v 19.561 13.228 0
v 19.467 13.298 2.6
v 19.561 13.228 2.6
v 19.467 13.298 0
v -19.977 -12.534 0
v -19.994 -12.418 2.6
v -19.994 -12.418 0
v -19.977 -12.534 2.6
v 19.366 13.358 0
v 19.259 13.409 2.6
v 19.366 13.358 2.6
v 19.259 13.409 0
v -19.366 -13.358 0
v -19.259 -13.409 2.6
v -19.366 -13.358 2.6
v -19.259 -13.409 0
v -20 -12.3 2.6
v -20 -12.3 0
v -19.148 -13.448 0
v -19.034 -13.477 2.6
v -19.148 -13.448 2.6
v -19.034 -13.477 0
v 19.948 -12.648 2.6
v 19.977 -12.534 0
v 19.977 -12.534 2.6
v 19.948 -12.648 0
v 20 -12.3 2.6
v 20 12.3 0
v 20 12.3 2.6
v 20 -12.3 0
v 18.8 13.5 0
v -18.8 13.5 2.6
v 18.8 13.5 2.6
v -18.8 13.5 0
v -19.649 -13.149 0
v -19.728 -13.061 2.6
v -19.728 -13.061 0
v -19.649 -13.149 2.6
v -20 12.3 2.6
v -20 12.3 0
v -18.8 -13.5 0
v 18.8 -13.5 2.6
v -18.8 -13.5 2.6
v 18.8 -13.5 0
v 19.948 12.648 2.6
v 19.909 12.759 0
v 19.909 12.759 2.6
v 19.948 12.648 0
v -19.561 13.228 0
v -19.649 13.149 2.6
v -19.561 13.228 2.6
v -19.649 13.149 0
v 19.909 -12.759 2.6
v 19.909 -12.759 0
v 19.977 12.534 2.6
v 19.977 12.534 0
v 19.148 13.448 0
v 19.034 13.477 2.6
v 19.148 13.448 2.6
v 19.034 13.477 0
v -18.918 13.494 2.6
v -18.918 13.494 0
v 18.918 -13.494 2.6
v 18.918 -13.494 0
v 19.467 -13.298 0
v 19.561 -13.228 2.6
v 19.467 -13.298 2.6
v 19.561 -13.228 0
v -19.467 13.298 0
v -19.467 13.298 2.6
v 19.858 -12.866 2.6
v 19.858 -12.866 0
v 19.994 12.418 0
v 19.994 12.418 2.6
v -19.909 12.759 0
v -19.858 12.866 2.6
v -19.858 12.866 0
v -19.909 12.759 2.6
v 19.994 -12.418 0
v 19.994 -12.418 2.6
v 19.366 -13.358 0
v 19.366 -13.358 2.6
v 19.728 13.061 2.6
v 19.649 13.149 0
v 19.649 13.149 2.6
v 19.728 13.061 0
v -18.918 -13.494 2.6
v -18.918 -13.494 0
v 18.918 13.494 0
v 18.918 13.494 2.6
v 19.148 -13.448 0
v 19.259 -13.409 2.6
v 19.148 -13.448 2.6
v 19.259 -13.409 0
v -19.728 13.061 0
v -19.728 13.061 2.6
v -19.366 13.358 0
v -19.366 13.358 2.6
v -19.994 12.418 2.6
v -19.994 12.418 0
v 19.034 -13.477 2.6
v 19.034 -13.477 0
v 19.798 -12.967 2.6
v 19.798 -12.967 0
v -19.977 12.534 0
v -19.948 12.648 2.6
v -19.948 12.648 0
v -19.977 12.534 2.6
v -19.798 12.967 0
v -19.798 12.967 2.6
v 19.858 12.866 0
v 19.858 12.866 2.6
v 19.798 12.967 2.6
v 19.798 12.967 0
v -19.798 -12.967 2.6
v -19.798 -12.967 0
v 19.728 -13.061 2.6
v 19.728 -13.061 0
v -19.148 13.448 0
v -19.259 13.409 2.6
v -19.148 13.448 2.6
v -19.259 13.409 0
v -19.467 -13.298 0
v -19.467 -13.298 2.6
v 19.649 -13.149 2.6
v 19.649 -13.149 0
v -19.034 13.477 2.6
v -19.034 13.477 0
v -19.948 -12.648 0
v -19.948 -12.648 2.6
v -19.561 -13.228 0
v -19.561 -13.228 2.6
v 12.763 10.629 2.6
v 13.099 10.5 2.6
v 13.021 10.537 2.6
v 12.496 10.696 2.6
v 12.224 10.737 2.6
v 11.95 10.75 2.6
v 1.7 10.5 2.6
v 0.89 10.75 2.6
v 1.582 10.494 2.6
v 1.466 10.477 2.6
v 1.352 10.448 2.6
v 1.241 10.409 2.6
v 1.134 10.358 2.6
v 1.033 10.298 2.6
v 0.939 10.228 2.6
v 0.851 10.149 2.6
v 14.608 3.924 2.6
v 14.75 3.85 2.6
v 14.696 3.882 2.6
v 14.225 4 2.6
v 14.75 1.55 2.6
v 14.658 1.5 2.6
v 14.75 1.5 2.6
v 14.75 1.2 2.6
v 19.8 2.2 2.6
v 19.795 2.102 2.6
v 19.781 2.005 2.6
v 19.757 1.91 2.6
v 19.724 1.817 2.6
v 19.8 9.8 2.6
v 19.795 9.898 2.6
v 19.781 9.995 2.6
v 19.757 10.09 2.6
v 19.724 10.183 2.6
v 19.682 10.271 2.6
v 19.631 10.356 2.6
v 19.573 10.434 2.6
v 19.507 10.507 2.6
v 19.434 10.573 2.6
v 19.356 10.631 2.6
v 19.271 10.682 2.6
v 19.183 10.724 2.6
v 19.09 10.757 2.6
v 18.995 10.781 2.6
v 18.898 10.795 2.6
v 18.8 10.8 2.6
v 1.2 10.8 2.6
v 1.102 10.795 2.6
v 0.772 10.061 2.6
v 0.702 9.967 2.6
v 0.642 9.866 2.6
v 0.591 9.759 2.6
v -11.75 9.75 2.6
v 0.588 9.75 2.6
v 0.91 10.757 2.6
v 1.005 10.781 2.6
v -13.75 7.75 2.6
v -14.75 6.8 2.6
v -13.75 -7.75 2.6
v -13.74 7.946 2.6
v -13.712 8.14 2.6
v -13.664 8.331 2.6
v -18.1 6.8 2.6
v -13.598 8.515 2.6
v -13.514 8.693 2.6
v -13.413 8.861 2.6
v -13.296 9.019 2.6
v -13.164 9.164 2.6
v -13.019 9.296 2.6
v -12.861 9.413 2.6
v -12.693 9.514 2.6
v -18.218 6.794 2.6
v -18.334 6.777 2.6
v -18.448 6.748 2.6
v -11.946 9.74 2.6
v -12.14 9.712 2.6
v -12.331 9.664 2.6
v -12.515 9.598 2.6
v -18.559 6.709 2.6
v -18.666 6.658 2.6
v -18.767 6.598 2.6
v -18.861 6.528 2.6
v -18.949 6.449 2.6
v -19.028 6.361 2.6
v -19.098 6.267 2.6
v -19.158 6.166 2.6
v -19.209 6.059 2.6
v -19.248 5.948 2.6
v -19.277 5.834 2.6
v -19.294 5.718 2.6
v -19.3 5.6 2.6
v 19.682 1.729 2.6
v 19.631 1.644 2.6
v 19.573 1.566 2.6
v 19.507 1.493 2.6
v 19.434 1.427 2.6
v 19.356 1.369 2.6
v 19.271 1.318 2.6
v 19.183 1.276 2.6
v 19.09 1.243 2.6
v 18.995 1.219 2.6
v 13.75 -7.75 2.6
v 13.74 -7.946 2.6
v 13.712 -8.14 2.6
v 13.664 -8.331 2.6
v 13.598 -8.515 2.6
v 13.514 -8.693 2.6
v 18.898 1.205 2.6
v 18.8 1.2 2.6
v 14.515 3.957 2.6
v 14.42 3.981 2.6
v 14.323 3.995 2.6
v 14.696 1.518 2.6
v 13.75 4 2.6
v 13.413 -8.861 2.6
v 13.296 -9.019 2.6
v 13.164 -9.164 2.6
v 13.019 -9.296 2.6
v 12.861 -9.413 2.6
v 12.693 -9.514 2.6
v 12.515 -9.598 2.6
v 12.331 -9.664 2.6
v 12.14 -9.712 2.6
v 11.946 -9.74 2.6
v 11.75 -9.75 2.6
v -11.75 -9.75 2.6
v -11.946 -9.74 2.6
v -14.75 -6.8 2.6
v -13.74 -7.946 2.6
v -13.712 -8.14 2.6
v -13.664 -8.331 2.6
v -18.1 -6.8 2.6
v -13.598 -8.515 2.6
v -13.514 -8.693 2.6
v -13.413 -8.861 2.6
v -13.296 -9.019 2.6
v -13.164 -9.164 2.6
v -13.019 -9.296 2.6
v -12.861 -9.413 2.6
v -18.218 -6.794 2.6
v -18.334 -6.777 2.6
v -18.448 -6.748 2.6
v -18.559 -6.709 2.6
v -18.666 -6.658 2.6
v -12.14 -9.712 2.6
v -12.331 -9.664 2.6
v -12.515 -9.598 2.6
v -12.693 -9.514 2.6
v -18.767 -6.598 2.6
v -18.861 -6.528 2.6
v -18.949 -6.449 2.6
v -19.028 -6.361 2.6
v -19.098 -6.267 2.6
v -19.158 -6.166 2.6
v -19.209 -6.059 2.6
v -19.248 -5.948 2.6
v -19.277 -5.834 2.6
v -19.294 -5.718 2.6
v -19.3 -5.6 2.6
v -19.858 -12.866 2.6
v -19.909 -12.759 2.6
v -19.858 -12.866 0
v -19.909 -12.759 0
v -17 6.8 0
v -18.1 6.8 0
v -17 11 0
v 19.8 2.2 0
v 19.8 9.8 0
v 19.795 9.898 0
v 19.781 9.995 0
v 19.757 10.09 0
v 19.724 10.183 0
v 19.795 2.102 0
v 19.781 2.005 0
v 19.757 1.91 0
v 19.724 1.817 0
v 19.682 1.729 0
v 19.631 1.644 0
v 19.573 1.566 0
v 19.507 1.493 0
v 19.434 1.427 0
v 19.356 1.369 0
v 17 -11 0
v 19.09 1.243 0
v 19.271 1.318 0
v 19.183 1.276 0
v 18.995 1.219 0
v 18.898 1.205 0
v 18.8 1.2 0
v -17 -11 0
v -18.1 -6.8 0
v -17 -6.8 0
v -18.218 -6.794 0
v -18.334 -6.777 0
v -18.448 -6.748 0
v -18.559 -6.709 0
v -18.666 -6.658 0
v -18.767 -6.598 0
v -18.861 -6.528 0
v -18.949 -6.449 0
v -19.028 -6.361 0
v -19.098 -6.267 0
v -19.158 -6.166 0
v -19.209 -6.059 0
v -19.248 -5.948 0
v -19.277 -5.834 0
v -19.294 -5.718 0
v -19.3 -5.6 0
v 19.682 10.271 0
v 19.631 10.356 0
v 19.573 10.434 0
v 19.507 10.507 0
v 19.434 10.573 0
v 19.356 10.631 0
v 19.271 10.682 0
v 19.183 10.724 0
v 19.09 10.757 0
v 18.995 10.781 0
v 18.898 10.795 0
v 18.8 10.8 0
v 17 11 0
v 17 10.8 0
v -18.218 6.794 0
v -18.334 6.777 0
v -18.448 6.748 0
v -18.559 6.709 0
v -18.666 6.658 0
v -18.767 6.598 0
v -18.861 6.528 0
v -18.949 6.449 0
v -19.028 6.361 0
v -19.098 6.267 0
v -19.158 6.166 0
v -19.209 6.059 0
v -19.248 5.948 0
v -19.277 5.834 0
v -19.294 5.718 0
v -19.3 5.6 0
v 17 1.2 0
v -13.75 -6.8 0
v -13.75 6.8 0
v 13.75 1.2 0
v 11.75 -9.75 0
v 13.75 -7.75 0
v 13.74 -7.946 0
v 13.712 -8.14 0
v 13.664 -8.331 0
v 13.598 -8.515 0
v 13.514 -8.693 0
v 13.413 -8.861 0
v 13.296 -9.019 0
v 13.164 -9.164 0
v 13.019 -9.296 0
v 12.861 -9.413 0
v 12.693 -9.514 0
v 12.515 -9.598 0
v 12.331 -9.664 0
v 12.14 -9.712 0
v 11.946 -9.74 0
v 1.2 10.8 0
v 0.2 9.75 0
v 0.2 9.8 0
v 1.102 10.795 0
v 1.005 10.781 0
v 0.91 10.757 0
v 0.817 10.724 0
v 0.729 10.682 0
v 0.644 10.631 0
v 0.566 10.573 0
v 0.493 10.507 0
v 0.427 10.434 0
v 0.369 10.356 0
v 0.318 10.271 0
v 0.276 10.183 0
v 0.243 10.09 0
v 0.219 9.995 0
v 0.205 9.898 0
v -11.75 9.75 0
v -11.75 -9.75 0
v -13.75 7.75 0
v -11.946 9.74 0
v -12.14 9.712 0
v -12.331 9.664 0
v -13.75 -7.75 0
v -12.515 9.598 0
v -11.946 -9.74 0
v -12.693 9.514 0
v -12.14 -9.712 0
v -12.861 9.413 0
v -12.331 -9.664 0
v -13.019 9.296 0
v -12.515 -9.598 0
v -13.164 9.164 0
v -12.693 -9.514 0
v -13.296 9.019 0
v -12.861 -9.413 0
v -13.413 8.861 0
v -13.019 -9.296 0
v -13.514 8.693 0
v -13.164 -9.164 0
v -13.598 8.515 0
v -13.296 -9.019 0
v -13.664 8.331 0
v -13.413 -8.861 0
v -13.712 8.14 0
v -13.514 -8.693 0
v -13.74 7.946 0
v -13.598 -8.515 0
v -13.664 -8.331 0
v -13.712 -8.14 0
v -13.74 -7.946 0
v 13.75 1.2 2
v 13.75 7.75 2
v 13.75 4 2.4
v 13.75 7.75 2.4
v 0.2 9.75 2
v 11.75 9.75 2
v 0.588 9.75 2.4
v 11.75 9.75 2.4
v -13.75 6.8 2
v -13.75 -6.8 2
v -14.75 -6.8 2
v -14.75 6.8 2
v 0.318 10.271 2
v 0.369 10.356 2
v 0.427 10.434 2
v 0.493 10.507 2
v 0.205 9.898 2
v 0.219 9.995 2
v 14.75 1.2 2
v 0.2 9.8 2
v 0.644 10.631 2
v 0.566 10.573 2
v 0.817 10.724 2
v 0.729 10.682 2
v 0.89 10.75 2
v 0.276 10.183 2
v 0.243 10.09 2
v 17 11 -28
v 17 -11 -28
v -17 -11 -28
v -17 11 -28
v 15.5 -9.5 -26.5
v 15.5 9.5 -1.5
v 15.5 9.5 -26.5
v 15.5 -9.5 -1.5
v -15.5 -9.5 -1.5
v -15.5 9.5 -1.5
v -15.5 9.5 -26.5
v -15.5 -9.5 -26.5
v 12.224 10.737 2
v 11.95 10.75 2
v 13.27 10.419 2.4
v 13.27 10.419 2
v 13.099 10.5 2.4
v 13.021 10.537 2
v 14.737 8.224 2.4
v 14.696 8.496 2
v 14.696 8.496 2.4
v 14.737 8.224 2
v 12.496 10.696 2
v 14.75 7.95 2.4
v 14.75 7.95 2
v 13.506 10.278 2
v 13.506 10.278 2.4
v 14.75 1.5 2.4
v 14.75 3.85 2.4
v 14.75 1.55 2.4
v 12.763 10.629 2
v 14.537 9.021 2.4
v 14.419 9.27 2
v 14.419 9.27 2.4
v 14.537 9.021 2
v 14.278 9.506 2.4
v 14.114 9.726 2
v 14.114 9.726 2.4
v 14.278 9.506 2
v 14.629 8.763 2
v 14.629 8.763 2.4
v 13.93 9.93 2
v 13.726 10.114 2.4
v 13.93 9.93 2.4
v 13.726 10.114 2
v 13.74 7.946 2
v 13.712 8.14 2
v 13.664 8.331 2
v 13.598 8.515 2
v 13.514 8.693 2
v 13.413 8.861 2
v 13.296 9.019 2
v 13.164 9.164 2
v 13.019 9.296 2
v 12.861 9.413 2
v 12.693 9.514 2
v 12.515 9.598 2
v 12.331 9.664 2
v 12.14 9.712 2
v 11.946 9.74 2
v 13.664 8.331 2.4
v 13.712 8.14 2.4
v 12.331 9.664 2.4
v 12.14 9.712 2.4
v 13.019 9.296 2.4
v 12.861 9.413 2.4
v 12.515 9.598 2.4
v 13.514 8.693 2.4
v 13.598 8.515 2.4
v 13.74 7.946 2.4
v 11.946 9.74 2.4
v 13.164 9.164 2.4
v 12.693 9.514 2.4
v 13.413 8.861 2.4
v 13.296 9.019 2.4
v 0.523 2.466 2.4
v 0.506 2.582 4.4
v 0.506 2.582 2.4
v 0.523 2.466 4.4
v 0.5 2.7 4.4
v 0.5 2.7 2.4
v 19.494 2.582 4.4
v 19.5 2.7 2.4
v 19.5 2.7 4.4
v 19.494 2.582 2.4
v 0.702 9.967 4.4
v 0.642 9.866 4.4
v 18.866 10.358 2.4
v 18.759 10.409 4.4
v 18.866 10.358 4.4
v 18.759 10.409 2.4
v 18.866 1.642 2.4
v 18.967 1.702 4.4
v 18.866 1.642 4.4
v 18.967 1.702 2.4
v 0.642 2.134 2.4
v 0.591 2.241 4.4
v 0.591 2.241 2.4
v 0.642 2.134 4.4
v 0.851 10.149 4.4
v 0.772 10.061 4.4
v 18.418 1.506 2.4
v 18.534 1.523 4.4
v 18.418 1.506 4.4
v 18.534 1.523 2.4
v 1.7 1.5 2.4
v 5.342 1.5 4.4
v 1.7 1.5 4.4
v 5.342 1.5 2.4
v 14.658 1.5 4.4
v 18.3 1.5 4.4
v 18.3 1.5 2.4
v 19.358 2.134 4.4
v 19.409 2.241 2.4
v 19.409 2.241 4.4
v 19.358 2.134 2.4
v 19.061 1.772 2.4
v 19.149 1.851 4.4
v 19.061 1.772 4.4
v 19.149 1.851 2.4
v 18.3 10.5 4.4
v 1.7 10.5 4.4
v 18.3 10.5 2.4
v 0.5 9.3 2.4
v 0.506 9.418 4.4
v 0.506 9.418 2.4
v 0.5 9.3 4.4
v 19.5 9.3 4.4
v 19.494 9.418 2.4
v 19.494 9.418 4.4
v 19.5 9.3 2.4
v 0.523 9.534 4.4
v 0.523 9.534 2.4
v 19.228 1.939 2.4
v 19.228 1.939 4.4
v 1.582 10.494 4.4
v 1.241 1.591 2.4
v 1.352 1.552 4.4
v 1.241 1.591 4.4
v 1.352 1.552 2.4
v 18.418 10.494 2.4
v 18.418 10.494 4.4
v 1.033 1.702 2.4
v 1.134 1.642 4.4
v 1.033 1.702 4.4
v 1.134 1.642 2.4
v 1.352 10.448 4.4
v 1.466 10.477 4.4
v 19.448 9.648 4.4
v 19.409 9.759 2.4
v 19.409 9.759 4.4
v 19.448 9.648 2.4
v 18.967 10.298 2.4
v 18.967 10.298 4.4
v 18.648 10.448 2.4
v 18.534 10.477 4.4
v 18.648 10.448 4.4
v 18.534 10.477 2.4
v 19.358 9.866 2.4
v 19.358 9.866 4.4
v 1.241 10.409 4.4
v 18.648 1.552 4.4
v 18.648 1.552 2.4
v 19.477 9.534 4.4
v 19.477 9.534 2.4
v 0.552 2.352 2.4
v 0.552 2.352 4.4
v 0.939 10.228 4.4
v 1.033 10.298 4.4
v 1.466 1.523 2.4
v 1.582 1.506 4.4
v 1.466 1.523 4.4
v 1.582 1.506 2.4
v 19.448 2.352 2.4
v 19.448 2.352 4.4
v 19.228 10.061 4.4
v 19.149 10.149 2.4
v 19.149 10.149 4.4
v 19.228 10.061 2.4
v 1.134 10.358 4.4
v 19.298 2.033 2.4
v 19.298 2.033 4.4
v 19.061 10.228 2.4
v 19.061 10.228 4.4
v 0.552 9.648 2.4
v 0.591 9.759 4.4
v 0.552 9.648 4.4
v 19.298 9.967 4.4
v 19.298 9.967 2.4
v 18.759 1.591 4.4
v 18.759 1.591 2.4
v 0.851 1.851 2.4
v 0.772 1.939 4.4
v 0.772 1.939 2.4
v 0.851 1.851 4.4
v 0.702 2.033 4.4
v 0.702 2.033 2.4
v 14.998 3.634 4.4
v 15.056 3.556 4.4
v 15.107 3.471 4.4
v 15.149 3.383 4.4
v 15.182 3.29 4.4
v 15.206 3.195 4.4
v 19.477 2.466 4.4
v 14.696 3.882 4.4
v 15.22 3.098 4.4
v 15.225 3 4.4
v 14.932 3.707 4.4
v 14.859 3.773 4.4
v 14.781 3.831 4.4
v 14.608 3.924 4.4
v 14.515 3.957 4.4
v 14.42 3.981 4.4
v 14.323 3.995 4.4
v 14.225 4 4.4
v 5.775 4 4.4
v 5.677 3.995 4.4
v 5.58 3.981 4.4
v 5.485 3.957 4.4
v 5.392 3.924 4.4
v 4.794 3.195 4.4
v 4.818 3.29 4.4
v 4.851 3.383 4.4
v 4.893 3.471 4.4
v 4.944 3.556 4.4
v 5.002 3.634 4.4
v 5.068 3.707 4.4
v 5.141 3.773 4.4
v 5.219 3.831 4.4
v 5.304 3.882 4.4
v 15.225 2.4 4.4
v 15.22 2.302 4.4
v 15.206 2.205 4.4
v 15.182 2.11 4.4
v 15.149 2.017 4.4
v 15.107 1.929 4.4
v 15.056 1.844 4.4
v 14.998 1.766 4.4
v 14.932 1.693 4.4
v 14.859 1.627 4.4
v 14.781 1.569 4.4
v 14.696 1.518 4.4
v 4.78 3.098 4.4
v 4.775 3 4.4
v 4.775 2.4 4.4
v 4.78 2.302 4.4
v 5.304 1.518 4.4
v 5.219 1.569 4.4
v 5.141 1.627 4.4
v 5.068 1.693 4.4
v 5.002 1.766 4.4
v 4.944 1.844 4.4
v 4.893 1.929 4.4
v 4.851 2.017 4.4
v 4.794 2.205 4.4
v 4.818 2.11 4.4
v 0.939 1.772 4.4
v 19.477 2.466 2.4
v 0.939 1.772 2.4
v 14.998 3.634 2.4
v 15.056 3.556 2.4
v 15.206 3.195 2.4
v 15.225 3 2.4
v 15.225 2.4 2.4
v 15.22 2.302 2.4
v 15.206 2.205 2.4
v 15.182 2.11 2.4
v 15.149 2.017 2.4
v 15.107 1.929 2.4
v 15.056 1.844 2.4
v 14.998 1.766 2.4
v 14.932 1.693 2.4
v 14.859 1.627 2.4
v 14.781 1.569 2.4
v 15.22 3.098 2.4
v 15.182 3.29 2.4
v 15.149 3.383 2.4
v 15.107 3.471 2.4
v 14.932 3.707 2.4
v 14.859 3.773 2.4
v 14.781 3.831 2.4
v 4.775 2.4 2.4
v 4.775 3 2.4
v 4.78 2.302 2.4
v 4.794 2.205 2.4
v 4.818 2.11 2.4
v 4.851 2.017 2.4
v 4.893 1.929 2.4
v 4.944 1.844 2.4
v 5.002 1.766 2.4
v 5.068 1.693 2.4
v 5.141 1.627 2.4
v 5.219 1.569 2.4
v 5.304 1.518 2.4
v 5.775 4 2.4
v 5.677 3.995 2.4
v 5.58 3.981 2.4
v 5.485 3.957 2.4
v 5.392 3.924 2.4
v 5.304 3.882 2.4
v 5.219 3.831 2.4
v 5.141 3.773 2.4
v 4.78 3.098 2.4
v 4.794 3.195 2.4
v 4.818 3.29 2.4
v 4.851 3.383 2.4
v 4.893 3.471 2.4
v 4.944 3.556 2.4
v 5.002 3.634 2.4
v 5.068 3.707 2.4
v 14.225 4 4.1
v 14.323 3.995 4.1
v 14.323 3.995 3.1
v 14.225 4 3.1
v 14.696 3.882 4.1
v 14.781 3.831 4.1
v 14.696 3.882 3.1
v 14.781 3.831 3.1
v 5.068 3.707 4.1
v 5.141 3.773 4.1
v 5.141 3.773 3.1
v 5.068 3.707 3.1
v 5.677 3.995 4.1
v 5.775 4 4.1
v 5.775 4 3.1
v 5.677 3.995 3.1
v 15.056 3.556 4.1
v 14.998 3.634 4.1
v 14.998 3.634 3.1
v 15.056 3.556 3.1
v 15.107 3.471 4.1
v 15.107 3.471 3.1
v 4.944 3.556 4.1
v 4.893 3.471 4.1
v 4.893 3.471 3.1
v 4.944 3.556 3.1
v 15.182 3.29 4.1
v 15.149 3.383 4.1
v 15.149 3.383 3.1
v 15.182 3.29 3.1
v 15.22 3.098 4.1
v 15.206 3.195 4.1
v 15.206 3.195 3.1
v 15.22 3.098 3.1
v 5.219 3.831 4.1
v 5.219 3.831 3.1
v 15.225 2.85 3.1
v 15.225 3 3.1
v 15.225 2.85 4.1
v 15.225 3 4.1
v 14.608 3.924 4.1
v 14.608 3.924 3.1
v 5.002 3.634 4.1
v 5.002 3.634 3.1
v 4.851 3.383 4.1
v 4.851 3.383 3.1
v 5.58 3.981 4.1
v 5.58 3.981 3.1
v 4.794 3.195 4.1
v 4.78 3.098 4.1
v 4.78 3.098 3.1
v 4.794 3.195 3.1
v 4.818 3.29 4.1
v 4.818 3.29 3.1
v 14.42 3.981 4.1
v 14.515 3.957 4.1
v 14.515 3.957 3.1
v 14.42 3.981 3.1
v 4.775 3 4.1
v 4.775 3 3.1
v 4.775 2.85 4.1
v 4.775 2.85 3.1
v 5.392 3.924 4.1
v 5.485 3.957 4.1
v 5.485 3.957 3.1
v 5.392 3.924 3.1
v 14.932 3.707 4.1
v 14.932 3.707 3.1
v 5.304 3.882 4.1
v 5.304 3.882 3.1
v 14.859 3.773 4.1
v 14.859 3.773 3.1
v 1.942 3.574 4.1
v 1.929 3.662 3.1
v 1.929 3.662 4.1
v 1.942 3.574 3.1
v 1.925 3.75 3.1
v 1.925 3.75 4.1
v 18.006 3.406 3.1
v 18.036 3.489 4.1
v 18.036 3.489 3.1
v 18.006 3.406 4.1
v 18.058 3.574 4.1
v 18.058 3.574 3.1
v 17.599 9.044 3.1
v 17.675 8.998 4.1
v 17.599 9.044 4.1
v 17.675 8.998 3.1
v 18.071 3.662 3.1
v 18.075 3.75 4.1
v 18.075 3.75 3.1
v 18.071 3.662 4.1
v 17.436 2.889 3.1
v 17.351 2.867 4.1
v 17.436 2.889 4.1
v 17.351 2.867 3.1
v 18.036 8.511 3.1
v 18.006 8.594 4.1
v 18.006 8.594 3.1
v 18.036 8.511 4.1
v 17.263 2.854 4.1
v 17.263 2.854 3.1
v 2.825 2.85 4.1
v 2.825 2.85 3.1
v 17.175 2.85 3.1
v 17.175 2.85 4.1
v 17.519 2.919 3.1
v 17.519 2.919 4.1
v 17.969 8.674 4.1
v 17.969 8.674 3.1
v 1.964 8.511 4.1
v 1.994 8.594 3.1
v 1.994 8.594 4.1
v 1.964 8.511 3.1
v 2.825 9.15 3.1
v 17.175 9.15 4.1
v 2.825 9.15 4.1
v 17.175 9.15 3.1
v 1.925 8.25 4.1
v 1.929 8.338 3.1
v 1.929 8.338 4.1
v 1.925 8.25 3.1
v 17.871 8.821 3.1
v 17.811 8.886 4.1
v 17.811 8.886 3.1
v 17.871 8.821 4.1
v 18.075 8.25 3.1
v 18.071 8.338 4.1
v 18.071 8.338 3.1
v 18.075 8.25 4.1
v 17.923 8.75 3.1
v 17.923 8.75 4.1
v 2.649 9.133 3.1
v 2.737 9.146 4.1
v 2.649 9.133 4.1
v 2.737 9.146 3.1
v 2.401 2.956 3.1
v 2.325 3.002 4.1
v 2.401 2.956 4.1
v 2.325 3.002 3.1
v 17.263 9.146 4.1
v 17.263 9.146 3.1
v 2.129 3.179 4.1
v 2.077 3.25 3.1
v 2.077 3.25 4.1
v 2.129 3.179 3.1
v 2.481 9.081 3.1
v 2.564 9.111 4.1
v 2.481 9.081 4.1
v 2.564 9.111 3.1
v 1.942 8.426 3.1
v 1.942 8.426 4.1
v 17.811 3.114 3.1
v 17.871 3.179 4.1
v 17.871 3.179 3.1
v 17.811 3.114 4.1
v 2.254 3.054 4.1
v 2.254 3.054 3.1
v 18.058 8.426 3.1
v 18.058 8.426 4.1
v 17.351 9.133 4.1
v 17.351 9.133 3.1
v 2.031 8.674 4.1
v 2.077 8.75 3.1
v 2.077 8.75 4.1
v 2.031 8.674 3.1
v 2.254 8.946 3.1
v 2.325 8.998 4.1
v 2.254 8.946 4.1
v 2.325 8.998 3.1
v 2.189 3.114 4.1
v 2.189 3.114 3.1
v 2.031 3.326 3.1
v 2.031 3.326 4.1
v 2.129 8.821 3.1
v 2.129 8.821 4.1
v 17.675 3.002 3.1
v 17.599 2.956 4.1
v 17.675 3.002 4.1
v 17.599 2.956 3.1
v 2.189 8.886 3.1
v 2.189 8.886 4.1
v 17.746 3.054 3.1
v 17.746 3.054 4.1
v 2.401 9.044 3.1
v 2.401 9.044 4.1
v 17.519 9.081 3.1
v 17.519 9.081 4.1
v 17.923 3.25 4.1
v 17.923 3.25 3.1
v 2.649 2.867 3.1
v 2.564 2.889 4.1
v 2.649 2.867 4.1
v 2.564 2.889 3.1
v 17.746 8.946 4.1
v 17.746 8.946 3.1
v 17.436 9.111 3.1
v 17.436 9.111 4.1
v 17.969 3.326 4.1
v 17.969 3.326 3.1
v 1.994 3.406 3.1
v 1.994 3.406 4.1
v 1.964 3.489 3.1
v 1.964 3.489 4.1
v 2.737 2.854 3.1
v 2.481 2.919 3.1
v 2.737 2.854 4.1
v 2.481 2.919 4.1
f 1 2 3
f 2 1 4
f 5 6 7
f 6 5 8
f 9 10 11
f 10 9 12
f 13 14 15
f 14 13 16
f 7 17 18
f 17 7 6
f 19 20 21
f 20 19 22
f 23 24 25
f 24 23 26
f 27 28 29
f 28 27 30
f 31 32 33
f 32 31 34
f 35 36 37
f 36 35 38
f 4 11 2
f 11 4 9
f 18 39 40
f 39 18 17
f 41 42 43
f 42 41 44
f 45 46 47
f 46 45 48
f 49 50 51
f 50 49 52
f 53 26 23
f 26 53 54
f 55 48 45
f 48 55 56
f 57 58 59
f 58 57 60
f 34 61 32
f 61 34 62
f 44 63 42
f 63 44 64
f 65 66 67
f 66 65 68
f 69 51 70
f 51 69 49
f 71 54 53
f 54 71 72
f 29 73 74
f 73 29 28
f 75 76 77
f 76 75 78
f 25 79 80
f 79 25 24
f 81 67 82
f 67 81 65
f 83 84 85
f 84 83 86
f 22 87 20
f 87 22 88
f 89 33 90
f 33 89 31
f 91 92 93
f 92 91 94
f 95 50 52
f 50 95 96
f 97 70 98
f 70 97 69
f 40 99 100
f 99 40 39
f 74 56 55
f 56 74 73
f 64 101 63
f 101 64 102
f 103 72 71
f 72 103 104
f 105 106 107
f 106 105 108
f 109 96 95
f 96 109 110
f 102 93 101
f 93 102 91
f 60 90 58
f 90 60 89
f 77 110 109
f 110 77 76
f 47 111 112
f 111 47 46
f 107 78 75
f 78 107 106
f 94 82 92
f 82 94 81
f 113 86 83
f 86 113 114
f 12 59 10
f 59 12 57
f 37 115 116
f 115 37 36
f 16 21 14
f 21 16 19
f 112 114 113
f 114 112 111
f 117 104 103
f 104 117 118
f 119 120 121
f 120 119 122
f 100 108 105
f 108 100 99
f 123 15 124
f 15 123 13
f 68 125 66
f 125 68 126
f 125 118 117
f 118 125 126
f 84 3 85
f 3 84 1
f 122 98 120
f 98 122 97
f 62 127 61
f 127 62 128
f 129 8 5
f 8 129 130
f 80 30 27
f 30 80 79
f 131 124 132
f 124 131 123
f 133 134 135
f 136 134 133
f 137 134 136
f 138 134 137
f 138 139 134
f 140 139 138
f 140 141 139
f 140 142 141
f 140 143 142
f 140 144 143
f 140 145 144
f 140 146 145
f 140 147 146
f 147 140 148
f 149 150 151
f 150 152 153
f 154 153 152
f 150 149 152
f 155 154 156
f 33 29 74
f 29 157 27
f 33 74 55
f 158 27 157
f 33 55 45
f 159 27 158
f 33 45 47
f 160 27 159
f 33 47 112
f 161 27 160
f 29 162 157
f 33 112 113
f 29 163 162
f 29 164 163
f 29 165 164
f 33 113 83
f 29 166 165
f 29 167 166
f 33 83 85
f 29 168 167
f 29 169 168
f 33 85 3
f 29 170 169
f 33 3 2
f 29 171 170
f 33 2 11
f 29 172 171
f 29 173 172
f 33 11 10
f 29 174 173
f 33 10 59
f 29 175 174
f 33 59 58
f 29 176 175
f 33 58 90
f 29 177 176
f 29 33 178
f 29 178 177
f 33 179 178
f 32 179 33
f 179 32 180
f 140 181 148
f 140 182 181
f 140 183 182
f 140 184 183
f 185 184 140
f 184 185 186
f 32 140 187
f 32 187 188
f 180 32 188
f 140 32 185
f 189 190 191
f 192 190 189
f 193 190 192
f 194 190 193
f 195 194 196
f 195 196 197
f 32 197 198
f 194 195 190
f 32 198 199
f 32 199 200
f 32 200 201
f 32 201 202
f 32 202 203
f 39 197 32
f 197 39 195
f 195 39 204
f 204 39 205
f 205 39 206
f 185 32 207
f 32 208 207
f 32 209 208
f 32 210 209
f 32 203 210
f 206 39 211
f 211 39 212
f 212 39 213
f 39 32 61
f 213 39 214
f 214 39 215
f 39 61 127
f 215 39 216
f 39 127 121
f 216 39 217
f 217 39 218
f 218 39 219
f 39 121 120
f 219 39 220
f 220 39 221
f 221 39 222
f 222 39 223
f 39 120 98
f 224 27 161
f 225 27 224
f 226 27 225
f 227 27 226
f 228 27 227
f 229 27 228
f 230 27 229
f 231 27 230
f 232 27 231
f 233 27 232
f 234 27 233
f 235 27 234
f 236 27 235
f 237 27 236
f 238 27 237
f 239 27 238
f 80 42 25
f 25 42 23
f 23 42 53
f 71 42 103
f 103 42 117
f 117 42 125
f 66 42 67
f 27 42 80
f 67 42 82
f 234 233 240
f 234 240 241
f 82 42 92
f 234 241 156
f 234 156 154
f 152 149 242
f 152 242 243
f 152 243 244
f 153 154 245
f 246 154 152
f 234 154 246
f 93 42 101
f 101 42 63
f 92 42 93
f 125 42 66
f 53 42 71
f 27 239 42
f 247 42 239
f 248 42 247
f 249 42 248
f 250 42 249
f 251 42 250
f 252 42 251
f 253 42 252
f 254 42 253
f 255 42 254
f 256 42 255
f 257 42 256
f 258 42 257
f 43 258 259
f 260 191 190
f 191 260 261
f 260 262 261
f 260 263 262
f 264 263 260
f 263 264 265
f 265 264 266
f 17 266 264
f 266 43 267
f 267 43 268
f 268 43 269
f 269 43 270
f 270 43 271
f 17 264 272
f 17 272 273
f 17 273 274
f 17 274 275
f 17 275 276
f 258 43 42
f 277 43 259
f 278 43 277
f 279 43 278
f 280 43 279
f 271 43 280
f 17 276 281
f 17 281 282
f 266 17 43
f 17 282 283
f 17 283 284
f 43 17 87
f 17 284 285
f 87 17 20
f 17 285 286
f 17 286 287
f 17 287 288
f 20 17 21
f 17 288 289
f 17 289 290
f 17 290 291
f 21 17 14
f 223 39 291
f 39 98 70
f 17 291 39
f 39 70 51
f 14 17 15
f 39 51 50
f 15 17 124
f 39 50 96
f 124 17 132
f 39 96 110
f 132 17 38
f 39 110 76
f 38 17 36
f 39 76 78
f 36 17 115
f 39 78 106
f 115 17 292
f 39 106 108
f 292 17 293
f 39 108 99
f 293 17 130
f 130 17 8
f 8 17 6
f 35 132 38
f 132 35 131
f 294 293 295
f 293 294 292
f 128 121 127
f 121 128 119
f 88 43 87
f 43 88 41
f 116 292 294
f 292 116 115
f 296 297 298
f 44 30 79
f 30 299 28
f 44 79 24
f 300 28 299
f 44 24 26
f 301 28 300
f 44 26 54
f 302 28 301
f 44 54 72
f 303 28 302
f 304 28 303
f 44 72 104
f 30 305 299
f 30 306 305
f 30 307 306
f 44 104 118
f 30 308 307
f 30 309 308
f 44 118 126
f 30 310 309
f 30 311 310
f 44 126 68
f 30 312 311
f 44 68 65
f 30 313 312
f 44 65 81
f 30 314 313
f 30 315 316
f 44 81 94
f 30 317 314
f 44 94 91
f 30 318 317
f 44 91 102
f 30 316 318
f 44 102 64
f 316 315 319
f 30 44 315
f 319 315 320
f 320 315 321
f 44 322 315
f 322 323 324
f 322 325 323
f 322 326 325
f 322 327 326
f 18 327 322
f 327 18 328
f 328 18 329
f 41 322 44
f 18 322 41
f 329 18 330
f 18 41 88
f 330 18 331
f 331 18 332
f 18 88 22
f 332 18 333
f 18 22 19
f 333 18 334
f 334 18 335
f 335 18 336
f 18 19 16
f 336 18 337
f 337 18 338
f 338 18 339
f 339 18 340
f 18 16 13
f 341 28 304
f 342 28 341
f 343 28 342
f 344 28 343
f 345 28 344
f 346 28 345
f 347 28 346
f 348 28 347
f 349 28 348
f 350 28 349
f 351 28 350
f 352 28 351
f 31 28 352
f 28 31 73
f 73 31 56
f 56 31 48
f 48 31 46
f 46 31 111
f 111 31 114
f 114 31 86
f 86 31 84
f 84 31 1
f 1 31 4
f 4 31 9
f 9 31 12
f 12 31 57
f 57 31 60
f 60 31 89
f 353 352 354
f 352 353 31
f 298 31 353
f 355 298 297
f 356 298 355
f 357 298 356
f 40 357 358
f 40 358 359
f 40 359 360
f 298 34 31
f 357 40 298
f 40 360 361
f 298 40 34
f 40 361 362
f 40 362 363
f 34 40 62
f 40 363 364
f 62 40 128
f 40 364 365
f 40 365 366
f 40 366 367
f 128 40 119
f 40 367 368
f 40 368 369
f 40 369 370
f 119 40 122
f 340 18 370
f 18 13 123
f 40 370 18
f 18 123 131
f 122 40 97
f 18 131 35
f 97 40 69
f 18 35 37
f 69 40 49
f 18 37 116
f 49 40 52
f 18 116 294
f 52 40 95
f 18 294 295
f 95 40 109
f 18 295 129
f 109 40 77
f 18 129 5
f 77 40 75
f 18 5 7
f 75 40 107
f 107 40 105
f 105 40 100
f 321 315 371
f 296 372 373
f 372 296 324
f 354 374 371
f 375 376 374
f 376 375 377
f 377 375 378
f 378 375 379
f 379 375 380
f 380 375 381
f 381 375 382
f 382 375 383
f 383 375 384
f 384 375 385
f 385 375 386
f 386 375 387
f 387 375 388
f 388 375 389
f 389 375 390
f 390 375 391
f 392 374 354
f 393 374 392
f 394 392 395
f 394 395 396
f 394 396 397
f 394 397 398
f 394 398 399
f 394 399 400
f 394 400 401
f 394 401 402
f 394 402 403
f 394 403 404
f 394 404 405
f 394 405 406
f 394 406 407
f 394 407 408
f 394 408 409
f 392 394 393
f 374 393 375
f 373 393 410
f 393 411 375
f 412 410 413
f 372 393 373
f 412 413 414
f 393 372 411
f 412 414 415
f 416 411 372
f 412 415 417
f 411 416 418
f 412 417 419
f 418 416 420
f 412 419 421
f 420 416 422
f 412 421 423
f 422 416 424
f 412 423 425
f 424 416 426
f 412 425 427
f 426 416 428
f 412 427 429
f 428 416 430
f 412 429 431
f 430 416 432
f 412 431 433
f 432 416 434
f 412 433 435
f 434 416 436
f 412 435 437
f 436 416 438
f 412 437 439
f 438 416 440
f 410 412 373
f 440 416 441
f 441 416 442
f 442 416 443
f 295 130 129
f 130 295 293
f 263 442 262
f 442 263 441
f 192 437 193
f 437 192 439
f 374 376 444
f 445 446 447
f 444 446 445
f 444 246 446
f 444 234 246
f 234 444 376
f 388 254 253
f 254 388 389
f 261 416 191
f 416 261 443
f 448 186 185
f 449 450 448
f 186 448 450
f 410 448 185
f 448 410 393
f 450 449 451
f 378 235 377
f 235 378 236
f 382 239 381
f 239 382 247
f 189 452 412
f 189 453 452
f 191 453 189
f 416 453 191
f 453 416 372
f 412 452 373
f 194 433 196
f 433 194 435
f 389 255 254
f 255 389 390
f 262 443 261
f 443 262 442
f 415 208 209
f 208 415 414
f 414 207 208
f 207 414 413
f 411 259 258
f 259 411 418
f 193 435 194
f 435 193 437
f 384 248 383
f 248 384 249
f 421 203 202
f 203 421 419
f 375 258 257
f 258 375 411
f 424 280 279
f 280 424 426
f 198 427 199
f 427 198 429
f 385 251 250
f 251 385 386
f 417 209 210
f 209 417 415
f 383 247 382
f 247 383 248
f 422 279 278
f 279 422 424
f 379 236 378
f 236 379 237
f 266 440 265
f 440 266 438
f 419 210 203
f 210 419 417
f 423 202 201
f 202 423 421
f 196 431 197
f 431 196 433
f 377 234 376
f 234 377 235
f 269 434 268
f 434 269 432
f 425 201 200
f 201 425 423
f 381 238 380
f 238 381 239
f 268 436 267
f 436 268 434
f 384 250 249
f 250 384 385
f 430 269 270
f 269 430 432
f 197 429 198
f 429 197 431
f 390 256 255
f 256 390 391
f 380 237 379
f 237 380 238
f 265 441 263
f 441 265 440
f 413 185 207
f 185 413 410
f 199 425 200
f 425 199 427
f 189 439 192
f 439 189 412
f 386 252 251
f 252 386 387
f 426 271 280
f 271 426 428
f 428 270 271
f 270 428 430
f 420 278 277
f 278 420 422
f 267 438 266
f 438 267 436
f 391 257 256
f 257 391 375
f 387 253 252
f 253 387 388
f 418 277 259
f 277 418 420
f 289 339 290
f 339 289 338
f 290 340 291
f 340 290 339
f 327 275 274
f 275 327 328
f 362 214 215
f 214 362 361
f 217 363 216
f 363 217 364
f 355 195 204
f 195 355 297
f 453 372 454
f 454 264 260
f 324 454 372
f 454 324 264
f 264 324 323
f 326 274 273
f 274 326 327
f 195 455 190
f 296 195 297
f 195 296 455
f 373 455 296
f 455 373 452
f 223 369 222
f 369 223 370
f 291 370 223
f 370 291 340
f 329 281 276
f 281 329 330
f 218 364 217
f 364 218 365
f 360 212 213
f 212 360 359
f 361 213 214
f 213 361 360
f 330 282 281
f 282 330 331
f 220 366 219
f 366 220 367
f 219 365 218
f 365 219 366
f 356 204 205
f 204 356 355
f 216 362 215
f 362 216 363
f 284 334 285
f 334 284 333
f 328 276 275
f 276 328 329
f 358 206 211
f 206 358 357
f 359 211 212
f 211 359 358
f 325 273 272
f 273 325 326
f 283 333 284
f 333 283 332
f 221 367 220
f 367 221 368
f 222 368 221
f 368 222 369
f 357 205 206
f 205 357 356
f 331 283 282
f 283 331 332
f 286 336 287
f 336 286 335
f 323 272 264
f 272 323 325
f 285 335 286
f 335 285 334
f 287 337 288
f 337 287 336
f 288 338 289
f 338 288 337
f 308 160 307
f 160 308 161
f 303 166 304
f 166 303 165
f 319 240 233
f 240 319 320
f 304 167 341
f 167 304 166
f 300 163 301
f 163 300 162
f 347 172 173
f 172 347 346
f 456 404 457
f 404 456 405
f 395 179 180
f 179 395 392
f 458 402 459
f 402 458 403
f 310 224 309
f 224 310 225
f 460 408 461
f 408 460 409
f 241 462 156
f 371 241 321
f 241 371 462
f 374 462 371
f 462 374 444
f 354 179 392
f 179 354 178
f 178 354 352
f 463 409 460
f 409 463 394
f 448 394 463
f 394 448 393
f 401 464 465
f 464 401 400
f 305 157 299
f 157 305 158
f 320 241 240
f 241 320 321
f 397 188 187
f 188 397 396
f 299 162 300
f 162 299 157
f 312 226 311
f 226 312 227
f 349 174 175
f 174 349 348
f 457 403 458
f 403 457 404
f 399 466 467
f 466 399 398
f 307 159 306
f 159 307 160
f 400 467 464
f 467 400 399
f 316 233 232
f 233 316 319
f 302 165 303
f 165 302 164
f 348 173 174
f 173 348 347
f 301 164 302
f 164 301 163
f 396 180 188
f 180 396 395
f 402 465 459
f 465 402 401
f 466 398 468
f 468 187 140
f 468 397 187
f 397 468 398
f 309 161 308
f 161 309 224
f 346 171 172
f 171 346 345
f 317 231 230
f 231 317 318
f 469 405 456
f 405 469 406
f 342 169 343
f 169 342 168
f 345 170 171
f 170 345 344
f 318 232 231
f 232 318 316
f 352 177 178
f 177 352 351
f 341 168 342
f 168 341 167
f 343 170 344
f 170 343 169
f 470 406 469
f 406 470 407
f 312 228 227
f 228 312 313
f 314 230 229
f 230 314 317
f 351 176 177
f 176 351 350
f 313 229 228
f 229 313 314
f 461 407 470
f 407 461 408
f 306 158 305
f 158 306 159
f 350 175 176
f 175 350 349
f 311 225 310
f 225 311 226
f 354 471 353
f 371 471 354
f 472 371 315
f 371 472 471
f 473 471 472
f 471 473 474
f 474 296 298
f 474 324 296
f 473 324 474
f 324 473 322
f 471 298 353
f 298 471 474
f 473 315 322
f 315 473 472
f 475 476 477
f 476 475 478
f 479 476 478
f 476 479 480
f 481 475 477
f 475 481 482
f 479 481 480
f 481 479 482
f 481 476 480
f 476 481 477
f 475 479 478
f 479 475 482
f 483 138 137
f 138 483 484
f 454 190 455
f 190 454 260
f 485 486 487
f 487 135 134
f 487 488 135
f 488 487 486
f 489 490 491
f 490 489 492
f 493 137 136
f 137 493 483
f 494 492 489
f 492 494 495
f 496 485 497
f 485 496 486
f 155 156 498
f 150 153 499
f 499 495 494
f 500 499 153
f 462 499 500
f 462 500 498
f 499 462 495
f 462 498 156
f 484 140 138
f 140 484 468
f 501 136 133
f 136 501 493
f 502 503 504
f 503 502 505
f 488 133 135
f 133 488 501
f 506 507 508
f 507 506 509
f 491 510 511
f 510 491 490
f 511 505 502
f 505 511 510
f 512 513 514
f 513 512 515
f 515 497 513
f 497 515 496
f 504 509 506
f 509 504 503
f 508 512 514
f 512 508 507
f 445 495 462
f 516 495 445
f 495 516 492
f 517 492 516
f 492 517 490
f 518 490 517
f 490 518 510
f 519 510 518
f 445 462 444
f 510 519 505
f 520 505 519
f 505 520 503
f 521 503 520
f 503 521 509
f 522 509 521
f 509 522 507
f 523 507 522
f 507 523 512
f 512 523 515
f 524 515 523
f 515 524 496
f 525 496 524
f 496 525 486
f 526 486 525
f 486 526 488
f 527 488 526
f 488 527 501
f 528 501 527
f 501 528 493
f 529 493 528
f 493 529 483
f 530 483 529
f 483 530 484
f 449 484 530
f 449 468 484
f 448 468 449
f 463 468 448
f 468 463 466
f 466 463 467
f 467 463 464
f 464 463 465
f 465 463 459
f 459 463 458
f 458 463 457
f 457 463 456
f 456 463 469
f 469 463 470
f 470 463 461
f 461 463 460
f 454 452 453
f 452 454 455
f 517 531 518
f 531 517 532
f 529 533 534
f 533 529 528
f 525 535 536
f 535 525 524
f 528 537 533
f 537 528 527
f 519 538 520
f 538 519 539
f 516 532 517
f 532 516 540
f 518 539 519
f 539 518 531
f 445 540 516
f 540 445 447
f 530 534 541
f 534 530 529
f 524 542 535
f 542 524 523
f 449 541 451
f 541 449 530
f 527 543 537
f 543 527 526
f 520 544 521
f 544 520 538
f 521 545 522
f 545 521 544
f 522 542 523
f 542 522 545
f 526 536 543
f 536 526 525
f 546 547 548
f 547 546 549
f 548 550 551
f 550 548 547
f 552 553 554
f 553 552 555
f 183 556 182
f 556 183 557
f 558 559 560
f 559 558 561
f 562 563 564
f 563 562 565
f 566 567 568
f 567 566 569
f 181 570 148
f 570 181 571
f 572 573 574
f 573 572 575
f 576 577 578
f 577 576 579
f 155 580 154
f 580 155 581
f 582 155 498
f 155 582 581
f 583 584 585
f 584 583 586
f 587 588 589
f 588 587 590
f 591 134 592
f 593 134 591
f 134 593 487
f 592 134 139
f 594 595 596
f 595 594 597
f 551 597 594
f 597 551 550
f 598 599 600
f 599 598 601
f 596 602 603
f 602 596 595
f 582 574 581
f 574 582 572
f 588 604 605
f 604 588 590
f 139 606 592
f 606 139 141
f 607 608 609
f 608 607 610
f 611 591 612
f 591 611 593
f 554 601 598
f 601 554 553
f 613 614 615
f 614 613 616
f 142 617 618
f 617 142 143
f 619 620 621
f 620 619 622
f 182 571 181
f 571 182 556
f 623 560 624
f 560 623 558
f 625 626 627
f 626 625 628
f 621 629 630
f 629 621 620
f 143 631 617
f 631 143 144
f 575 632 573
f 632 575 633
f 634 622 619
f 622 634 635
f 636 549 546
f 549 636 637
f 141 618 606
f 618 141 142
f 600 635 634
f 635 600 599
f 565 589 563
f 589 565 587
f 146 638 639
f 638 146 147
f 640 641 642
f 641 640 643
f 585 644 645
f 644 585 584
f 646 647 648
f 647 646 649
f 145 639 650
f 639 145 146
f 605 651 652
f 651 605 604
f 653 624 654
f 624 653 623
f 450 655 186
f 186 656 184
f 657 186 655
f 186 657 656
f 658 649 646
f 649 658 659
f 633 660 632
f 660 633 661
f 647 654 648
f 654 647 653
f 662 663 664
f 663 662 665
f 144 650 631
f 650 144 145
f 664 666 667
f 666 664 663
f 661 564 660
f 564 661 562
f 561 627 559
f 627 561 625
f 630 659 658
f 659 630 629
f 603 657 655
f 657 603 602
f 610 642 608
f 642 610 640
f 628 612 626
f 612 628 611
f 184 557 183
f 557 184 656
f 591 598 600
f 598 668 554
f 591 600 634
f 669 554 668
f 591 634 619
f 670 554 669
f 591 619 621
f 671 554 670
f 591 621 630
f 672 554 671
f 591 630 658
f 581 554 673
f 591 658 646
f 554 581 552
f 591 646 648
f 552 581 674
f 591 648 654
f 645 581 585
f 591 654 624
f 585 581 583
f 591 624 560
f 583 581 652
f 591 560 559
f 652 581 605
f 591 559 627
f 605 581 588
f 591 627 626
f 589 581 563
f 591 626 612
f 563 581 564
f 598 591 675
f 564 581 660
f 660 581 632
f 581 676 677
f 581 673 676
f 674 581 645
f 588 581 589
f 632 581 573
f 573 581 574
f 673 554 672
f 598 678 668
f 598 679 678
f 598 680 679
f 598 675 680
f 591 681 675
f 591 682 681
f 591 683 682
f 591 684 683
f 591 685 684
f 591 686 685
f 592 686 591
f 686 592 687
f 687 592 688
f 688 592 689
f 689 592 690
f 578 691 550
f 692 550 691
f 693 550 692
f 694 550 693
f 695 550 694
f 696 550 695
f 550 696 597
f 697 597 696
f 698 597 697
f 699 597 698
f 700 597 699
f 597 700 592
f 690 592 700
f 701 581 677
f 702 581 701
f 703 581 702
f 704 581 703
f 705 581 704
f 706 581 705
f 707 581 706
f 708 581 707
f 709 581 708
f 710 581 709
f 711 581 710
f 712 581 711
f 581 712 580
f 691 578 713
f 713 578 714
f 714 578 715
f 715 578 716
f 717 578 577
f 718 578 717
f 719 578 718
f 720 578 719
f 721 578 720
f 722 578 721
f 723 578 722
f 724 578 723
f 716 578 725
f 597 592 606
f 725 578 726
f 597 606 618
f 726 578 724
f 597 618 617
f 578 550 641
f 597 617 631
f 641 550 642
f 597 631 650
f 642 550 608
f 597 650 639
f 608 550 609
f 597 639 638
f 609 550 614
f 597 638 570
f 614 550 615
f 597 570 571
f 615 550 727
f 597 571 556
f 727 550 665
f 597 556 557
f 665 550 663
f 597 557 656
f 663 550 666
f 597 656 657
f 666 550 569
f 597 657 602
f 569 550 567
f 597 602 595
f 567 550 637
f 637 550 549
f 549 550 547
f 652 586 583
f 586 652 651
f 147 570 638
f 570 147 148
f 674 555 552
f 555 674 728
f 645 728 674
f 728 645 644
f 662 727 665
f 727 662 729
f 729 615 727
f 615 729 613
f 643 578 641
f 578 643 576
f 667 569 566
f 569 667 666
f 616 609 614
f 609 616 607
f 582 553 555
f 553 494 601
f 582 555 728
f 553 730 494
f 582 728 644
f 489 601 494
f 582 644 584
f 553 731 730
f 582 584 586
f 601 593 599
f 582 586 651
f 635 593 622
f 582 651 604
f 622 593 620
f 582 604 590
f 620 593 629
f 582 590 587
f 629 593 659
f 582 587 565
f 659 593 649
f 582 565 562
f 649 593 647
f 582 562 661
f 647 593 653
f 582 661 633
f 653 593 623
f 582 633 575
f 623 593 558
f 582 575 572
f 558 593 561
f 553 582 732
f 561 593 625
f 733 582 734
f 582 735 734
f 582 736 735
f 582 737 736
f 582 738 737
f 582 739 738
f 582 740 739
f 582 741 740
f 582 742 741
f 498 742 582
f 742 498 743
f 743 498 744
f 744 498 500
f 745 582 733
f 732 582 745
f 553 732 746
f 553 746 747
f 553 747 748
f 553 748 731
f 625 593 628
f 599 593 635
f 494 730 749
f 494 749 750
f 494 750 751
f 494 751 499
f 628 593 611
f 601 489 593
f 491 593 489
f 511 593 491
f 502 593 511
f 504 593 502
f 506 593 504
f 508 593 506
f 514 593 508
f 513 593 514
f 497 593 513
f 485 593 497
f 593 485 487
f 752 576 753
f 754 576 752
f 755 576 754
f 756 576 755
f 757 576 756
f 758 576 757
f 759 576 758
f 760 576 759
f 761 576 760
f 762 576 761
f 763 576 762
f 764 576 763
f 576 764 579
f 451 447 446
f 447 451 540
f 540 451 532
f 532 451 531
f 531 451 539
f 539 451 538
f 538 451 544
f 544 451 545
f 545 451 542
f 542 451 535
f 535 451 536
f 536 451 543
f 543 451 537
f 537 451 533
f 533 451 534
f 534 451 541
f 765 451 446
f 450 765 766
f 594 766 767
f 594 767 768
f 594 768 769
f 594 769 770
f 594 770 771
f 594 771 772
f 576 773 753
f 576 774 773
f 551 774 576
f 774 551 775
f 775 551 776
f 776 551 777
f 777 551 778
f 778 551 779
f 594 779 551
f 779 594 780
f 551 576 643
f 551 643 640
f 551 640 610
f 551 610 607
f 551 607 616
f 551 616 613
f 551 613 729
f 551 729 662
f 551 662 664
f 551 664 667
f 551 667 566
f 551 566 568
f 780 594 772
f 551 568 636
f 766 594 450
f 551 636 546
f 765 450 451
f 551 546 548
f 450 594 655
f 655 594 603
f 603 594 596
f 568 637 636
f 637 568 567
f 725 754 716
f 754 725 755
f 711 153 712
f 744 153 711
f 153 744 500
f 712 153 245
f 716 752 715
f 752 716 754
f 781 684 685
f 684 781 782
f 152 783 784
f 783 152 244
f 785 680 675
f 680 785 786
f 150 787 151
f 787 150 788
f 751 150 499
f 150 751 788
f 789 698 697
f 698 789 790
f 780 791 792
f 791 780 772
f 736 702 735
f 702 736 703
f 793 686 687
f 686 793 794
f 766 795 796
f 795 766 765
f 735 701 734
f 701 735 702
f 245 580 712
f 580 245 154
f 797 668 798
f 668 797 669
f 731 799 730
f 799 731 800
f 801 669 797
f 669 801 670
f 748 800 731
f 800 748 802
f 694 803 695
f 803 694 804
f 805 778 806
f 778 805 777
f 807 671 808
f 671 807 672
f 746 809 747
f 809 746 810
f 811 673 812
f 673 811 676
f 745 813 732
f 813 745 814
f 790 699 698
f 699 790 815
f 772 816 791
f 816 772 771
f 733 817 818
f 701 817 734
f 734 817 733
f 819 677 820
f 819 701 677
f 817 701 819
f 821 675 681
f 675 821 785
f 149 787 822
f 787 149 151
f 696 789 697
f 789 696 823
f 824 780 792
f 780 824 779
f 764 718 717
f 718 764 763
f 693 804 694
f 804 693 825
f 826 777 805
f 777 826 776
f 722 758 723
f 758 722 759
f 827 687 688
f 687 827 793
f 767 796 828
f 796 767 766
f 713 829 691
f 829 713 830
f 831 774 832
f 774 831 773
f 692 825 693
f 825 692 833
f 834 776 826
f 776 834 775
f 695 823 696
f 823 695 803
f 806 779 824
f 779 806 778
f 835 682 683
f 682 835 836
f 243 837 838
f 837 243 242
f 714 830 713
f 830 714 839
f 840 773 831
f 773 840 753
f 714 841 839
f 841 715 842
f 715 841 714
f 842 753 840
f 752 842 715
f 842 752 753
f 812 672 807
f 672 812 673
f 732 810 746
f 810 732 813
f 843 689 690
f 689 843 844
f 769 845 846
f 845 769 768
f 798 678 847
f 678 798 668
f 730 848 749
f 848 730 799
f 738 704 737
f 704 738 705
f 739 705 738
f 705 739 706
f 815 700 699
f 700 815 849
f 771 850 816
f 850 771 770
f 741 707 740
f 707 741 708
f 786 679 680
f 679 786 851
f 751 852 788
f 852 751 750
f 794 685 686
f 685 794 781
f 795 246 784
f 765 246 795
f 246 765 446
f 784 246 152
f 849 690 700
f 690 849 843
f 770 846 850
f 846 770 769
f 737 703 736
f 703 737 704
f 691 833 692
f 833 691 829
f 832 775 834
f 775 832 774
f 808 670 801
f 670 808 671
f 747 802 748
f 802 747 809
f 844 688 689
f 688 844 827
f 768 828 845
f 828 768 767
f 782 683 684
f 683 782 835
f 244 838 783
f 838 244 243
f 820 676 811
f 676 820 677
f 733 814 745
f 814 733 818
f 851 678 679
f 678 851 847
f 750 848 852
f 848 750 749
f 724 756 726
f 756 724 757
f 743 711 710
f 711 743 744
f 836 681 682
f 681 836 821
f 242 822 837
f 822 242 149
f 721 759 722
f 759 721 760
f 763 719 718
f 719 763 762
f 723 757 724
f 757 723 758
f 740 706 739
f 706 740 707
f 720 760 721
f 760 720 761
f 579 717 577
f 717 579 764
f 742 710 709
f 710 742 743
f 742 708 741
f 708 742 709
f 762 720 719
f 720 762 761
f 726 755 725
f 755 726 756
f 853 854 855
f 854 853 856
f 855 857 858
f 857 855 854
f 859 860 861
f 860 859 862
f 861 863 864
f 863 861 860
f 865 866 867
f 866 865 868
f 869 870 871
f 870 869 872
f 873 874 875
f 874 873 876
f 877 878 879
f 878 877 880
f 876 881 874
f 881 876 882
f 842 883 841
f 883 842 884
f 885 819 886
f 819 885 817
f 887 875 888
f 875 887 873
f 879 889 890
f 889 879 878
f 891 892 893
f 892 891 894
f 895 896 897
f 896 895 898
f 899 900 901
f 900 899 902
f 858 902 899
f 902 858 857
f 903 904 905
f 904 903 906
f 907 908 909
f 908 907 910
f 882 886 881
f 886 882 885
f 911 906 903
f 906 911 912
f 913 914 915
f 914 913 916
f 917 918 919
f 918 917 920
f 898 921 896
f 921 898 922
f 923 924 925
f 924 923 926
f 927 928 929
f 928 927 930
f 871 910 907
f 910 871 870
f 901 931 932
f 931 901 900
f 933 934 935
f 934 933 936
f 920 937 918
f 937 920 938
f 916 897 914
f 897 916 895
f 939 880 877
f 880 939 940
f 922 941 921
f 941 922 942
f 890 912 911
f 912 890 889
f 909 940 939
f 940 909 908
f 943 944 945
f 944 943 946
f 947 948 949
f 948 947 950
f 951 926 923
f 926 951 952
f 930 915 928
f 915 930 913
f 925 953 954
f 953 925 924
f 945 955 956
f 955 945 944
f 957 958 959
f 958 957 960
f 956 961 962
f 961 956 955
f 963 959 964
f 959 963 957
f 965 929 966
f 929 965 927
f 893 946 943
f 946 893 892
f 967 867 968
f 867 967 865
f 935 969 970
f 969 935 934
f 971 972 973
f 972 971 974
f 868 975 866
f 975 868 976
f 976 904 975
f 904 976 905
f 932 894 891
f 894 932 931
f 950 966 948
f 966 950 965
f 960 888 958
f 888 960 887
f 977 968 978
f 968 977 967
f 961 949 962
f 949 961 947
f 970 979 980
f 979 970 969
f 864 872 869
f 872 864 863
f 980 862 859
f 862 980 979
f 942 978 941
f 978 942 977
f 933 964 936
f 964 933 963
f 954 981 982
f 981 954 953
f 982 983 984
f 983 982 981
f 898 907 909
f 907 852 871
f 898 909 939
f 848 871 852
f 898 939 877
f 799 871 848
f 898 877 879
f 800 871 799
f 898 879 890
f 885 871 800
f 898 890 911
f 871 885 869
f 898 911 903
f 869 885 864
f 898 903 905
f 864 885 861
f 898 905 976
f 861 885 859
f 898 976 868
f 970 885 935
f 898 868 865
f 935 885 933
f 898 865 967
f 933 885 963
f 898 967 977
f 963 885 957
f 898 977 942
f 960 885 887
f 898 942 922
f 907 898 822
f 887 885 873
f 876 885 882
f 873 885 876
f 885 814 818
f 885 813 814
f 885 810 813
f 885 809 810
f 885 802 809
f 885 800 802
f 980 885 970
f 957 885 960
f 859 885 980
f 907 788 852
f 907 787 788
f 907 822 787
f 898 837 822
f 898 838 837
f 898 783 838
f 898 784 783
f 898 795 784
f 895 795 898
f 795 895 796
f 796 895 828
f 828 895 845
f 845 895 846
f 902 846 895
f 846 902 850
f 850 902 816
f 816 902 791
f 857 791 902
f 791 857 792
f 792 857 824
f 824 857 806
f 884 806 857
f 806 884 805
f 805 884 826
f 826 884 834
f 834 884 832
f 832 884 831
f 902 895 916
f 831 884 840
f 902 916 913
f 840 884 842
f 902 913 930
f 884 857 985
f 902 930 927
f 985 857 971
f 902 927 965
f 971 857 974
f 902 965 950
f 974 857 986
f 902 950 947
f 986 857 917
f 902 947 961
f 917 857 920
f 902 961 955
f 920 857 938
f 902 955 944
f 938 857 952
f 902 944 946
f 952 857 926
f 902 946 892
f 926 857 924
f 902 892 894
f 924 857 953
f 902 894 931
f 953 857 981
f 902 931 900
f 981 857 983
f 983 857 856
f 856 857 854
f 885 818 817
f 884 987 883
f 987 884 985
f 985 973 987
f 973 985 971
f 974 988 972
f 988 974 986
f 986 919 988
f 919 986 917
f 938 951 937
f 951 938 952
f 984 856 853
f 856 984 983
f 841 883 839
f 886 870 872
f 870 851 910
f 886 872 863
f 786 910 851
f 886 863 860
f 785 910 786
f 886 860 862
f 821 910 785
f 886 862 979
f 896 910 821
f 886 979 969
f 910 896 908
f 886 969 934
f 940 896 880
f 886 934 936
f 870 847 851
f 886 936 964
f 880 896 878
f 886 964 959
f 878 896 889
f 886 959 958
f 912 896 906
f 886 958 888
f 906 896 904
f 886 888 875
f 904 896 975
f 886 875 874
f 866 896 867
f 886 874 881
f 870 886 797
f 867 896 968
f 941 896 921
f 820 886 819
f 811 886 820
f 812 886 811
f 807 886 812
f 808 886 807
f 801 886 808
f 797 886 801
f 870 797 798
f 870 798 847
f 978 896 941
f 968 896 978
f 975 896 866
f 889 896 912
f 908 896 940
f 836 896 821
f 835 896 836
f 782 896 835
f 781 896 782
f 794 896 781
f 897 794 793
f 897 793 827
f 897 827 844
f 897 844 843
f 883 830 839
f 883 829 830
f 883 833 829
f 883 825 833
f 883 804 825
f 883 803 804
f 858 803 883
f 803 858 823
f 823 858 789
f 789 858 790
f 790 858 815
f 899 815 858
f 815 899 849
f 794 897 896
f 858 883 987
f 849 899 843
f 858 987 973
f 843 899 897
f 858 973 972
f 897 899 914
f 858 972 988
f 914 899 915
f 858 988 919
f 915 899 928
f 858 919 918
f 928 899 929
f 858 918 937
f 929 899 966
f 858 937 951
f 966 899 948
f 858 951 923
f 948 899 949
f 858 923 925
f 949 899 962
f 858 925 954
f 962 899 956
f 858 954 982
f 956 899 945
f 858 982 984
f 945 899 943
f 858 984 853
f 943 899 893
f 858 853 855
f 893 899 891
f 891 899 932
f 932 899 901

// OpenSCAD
$fn=64;

// IEC C14 switched fused inlet module (approximate external model)
// Overall faceplate: 40 x 27 mm
// Includes: faceplate, inlet body, switch rocker, fuse drawer, and simplified C14 opening.

module iec_inlet_module(
    face_w=40.0,
    face_h=27.0,
    face_t=2.6,

    body_w=34.0,
    body_h=22.0,
    body_d=28.0,

    bezel_r=1.2,

    // C14 opening (simplified)
    c14_w=27.5,
    c14_h=19.5,
    c14_corner_r=2.0,
    c14_inset=0.6,

    // Switch rocker (approx)
    sw_w=19.0,
    sw_h=13.0,
    sw_t=2.2,
    sw_offset_x=-9.5,   // left side
    sw_offset_y=0.0,

    // Fuse drawer (approx)
    fuse_w=19.0,
    fuse_h=9.0,
    fuse_t=2.0,
    fuse_offset_x=10.0, // right side
    fuse_offset_y=6.0
){
    // Faceplate centered at origin, normal +Z
    difference() {
        // Faceplate with rounded corners
        linear_extrude(height=face_t)
            rounded_rect(face_w, face_h, bezel_r);

        // C14 opening cut (centered)
        translate([0, 0, -0.01])
            linear_extrude(height=face_t + 0.02)
                rounded_rect(c14_w, c14_h, c14_corner_r);

        // Switch window cut (left)
        translate([sw_offset_x, sw_offset_y, -0.01])
            linear_extrude(height=face_t + 0.02)
                rounded_rect(sw_w+0.6, sw_h+0.6, 1.2);

        // Fuse window cut (right/top-ish)
        translate([fuse_offset_x, fuse_offset_y, -0.01])
            linear_extrude(height=face_t + 0.02)
                rounded_rect(fuse_w+0.6, fuse_h+0.6, 1.0);
    }

    // Main body behind faceplate
    translate([0, 0, -body_d])
        difference() {
            // Outer body
            translate([0,0,body_d/2])
                cube([body_w, body_h, body_d], center=true);

            // Hollow cavity (simplified)
            translate([0,0,body_d/2])
                cube([body_w-3.0, body_h-3.0, body_d-3.0], center=true);

            // C14 throat (behind opening)
            translate([0,0,body_d - 10])
                cube([c14_w-2.0, c14_h-2.0, 14], center=true);
        }

    // Slight recessed lip around C14 opening (visual)
    translate([0,0,face_t - c14_inset])
        difference() {
            linear_extrude(height=c14_inset)
                rounded_rect(c14_w+2.0, c14_h+2.0, c14_corner_r+0.8);
            translate([0,0,-0.01])
                linear_extrude(height=c14_inset+0.02)
                    rounded_rect(c14_w, c14_h, c14_corner_r);
        }

    // Switch rocker (protruding slightly)
    translate([sw_offset_x, sw_offset_y, face_t-0.2])
        rocker(sw_w, sw_h, sw_t);

    // Fuse drawer (protruding slightly)
    translate([fuse_offset_x, fuse_offset_y, face_t-0.2])
        fuse_drawer(fuse_w, fuse_h, fuse_t);
}

// Helpers
module rounded_rect(w,h,r){
    r2 = min(r, min(w,h)/2);
    hull(){
        for (sx=[-1,1], sy=[-1,1])
            translate([sx*(w/2-r2), sy*(h/2-r2)])
                circle(r=r2);
    }
}

module rocker(w,h,t){
    // Slightly convex rocker
    difference(){
        // Base
        linear_extrude(height=t)
            rounded_rect(w,h,1.6);
        // Top scoop to suggest rocker curvature
        translate([0,0,t*0.55])
            rotate([90,0,0])
                cylinder(r=h*0.75, h=w+2, center=true);
    }
}

module fuse_drawer(w,h,t){
    // Drawer with small finger notch
    difference(){
        linear_extrude(height=t)
            rounded_rect(w,h,1.2);
        // notch
        translate([0, -h/2+1.2, -0.01])
            linear_extrude(height=t+0.02)
                rounded_rect(w*0.55, 2.6, 1.0);
        // shallow label recess
        translate([0,0,t*0.35])
            linear_extrude(height=t*0.5)
                rounded_rect(w*0.85, h*0.7, 0.9);
    }
}

// Render
iec_inlet_module();
